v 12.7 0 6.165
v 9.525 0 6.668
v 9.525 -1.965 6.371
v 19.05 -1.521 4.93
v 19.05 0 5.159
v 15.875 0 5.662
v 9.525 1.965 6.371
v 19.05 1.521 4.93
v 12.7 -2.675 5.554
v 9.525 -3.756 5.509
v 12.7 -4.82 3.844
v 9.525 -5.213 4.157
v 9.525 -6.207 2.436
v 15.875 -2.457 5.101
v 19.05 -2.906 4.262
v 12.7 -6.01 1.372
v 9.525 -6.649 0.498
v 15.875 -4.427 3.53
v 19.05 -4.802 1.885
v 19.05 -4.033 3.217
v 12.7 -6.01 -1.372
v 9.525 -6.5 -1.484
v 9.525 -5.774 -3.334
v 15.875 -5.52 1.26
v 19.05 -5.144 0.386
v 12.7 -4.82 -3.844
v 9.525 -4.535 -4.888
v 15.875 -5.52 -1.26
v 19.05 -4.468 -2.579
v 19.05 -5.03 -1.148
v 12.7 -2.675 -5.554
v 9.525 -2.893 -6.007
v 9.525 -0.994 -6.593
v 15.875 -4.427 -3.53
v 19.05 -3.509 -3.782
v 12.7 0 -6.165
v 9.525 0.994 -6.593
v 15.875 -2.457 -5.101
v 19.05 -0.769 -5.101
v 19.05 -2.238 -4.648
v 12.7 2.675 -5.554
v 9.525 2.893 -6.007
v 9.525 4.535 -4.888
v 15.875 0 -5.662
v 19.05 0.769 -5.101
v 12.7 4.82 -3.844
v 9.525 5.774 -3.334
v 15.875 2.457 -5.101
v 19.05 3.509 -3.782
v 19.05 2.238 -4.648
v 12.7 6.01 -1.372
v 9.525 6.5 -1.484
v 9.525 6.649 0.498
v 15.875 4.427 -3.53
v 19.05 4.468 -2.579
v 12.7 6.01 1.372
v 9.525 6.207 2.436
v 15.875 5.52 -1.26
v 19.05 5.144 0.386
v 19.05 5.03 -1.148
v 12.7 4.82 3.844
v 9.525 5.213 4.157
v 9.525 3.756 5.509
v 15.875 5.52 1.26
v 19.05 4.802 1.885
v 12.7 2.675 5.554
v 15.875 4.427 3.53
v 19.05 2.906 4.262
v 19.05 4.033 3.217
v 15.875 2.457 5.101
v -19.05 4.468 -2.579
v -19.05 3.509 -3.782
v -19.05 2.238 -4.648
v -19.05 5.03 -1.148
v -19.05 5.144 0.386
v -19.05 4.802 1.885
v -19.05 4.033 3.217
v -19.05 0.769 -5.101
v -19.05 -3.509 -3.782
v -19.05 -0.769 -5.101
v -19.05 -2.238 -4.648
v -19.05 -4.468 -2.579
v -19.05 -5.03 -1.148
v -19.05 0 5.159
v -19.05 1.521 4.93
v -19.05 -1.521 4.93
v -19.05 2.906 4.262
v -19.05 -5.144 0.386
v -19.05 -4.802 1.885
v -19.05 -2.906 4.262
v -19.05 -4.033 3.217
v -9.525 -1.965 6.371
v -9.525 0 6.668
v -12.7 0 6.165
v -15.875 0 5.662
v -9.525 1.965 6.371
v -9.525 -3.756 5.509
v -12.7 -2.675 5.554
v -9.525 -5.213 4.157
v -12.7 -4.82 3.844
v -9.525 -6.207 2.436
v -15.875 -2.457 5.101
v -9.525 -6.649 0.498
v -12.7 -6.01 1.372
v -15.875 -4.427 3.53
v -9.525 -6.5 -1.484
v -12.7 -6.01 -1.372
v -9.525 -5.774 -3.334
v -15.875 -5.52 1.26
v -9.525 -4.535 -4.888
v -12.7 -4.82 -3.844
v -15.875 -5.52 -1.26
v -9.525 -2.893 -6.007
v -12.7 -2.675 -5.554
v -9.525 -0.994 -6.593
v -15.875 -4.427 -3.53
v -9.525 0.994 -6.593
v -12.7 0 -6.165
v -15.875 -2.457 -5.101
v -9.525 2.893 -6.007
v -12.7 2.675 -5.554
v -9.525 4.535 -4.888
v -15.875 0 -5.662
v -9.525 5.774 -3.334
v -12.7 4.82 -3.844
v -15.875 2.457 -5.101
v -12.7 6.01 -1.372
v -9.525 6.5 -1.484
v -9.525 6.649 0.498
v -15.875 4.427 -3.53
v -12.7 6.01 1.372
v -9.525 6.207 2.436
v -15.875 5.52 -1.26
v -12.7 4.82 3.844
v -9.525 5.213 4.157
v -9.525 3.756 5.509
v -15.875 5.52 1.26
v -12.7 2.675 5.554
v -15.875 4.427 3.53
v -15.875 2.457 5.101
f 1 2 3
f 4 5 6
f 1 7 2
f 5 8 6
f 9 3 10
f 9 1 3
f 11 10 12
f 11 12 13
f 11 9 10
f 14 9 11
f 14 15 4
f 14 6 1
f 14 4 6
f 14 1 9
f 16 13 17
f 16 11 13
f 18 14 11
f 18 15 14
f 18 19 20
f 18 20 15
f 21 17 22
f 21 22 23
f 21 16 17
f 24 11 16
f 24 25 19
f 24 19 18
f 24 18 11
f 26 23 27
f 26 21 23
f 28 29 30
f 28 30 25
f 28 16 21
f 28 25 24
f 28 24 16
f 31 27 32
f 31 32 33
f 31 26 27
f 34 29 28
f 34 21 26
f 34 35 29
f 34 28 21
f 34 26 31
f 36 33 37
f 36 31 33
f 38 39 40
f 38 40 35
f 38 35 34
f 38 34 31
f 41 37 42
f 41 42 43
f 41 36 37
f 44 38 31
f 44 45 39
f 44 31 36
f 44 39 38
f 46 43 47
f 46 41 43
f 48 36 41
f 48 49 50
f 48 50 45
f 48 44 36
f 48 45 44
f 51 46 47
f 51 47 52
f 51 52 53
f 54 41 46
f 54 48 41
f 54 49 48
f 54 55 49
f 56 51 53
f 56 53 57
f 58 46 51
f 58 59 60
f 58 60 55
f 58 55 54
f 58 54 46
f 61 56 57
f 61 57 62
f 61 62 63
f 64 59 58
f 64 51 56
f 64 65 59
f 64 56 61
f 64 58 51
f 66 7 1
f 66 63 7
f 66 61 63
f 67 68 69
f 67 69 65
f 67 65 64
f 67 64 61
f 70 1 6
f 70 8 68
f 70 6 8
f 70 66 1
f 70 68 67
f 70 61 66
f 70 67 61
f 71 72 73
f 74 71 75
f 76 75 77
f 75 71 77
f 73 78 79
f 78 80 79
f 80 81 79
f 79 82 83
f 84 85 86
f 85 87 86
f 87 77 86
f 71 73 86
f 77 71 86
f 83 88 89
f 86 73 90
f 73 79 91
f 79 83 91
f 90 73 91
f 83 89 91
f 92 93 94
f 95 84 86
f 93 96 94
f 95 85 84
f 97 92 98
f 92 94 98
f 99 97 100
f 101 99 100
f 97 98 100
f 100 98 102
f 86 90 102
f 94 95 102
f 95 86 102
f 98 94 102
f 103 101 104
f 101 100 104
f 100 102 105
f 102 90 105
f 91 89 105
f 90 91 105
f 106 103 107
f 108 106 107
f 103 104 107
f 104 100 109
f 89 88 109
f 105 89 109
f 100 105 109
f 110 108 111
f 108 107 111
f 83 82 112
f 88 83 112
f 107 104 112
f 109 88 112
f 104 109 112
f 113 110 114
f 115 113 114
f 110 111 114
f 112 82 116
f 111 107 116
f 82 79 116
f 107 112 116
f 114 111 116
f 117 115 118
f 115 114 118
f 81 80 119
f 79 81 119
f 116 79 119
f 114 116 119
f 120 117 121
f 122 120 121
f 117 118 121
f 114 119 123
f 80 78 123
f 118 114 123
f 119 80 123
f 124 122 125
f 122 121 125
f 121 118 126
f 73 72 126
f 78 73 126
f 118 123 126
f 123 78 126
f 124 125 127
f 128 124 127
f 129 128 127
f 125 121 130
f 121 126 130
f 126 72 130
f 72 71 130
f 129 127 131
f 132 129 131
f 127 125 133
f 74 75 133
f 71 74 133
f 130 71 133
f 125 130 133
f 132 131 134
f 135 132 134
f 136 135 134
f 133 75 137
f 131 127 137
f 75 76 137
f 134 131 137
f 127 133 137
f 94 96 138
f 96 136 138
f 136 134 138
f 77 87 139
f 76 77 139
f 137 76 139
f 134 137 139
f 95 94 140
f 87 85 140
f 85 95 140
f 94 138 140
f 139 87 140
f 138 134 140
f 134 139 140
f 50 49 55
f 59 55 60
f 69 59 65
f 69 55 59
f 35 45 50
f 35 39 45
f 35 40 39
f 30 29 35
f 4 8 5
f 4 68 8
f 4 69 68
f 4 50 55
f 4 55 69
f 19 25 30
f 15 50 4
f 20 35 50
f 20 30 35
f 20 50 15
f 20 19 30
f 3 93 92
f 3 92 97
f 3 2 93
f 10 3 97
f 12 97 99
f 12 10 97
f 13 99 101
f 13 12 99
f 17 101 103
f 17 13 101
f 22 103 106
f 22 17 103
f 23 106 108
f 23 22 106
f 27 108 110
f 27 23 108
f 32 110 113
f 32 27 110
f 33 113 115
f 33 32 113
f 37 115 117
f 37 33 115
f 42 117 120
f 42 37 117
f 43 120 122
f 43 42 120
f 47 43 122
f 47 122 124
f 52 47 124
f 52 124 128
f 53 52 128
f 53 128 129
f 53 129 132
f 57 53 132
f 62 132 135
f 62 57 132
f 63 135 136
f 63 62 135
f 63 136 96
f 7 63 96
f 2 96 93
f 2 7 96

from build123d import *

# Parameters (mm, degrees)
SKETCH1_R           = 6.6675
BOSS_EXTRUDE1_DEPTH = 9.525
SKETCH3_R           = 6.6675
BOSS_EXTRUDE2_DEPTH = 9.525
BOSS_EXTRUDE2_TAPER = 9


with BuildPart() as part:
    # Sketch1 → Boss-Extrude1 (new, symmetric)
    with BuildSketch(Plane(origin=(0, 0, 0), x_dir=(0, 0, -1), z_dir=(1, 0, 0))):
        with Locations(Location((0, 0, 0), (0, 0, 180))):
            Circle(SKETCH1_R)
    extrude(amount=BOSS_EXTRUDE1_DEPTH, both=True)

    # Sketch3 → Boss-Extrude2 (add)
    with BuildSketch(Plane(origin=(9.525, 0, 0), x_dir=(0, 0, -1), z_dir=(1, 0, 0))):
        with Locations(Location((0, 0, 0), (0, 0, 180))):
            Circle(SKETCH3_R)
    boss_extrude2 = extrude(amount=BOSS_EXTRUDE2_DEPTH, taper=BOSS_EXTRUDE2_TAPER)

    # Mirror1: Boss-Extrude2 across plane
    add(boss_extrude2.mirror(Plane(origin=(0, 0, 0), x_dir=(0, 0, 1), z_dir=(1, 0, 0))))


solid = part.part
